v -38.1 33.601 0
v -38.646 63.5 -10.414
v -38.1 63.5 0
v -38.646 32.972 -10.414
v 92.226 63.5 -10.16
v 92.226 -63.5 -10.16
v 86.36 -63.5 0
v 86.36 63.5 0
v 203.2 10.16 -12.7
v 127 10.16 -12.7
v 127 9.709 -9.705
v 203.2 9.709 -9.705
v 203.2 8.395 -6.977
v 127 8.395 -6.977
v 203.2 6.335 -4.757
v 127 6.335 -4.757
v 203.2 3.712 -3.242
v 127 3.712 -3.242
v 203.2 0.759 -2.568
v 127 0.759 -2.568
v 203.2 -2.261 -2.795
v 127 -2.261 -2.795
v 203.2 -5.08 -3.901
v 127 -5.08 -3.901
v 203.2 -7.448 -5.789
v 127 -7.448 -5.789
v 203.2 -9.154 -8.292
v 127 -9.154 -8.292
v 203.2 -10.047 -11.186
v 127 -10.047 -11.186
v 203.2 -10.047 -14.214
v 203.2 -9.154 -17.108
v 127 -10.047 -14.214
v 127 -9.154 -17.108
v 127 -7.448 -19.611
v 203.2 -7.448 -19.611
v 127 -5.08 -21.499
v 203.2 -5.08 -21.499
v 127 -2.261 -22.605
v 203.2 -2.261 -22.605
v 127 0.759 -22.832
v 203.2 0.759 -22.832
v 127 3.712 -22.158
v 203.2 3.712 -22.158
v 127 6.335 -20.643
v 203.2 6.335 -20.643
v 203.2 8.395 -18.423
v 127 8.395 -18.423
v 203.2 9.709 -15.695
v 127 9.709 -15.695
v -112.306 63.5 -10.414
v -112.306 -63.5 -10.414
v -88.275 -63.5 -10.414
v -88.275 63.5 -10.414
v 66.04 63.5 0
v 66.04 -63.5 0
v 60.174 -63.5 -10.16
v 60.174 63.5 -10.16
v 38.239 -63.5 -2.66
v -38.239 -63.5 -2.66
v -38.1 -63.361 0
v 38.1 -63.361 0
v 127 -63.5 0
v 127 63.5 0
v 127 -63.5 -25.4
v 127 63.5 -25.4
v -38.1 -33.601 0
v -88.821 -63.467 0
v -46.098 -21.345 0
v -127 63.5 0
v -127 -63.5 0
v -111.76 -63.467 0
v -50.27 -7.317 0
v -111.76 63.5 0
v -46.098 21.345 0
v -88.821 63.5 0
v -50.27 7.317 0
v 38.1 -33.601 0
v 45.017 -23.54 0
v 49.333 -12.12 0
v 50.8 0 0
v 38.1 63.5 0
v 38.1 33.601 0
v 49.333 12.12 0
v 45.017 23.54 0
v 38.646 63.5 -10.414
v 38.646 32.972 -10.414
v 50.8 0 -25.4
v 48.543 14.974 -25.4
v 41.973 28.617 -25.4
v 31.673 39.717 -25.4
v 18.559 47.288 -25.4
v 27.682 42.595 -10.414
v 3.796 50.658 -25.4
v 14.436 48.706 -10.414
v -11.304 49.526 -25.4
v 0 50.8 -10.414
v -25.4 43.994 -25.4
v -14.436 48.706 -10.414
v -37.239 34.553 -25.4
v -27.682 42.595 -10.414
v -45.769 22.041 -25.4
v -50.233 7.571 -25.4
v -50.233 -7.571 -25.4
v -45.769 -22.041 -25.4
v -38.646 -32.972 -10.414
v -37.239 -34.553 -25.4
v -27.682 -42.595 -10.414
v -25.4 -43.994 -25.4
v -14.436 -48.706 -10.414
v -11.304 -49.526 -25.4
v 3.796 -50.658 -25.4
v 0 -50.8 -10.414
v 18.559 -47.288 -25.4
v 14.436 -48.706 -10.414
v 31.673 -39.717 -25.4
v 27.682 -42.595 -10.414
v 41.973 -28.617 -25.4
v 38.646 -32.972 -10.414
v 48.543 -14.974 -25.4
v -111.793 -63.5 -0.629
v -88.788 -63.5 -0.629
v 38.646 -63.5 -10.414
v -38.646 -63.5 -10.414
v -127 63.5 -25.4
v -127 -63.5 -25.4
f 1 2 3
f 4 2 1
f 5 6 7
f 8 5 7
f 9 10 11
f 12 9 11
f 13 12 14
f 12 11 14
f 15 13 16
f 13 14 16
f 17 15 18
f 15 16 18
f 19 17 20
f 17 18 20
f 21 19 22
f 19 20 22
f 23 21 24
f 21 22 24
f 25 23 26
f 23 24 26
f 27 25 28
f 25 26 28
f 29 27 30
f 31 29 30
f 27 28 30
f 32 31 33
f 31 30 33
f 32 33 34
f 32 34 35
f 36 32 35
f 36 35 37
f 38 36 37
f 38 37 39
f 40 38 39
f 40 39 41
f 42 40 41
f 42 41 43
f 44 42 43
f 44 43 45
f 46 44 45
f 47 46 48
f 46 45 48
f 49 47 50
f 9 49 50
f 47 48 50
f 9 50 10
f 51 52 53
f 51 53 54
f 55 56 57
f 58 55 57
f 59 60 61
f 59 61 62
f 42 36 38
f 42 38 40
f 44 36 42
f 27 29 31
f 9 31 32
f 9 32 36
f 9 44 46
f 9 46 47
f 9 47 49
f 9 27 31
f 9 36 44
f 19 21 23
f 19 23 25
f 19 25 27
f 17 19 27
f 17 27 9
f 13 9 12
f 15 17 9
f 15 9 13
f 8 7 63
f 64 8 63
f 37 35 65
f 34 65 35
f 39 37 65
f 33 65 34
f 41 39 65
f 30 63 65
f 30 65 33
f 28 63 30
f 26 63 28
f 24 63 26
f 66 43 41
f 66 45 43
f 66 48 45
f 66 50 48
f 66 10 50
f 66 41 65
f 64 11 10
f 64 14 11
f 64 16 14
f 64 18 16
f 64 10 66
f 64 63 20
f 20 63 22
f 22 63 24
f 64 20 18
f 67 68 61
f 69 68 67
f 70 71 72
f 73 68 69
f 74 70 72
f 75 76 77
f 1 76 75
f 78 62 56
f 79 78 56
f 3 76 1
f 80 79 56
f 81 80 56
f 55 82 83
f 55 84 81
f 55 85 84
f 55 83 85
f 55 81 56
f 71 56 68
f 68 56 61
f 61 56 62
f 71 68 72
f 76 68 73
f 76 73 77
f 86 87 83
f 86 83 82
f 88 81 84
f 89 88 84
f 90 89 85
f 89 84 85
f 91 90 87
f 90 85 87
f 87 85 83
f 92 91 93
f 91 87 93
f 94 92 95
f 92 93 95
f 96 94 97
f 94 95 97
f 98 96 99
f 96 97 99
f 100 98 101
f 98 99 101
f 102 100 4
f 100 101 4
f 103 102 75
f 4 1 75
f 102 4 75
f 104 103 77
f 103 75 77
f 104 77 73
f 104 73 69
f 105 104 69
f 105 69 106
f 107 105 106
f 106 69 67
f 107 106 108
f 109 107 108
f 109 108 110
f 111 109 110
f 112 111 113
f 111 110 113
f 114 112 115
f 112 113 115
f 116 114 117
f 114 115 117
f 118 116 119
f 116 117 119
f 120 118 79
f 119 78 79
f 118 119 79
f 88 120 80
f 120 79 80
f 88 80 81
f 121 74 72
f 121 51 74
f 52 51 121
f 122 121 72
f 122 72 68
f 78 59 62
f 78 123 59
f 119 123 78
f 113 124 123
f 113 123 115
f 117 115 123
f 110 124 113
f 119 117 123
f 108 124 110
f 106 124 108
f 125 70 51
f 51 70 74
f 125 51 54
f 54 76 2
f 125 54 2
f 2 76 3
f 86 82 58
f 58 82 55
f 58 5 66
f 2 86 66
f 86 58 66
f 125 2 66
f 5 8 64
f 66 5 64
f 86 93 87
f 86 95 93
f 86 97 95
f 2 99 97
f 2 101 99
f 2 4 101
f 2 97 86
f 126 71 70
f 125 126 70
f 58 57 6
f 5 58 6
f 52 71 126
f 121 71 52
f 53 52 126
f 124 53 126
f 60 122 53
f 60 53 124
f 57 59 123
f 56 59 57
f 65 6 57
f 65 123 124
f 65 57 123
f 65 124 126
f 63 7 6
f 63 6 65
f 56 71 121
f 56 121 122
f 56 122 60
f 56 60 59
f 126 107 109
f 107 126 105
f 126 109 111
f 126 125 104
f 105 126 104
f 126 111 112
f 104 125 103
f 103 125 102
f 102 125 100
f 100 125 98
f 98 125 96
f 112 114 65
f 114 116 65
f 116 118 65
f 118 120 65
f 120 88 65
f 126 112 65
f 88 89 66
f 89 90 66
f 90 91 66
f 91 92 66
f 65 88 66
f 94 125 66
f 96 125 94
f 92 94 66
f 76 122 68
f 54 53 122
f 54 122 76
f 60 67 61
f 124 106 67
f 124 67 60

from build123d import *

# Parameters (mm, degrees)
F1_W     = 254
F1_H     = 127
F1_R     = 50.8
F2_DEPTH = 25.4
F5_DEPTH = 127.001
F3_W     = 22.938862443
F3_H     = 126.9670481086
F3_W_2   = 76.2
F3_H_2   = 126.8606091142
F7_DEPTH = 10.414
F7_TAPER = -3
F6_R     = 10.16
F8_DEPTH = 76.2


with BuildPart() as f2:
    # F1 (on face) → F2 (new body)
    with BuildSketch(Plane.XY):
        Rectangle(F1_W, F1_H)
        Circle(F1_R, mode=Mode.SUBTRACT)
    extrude(amount=-F2_DEPTH)

    # F4 (on face) → F5 (cut, through all)
    with BuildSketch(Plane.XZ.offset(63.5)):
        Polygon((86.36, 0), (66.04, 0), (60.174121265, -10.16), (92.225878735, -10.16), align=None)
    extrude(amount=-F5_DEPTH, mode=Mode.SUBTRACT)

    # F3 (on face) → F7 (cut)
    with BuildSketch(Plane.XY):
        with Locations((-100.2905687785, 0.0164759457)):
            Rectangle(F3_W, F3_H)
        with Locations((0, 0.0696954429)):
            Rectangle(F3_W_2, F3_H_2)
    extrude(amount=-F7_DEPTH, taper=F7_TAPER, mode=Mode.SUBTRACT)

    # F6 (on face) → F8 (join)
    with BuildSketch(Plane.YZ.offset(127)):
        with Locations((0, -12.7)):
            Circle(F6_R)
    extrude(amount=F8_DEPTH)


solid = f2.part
